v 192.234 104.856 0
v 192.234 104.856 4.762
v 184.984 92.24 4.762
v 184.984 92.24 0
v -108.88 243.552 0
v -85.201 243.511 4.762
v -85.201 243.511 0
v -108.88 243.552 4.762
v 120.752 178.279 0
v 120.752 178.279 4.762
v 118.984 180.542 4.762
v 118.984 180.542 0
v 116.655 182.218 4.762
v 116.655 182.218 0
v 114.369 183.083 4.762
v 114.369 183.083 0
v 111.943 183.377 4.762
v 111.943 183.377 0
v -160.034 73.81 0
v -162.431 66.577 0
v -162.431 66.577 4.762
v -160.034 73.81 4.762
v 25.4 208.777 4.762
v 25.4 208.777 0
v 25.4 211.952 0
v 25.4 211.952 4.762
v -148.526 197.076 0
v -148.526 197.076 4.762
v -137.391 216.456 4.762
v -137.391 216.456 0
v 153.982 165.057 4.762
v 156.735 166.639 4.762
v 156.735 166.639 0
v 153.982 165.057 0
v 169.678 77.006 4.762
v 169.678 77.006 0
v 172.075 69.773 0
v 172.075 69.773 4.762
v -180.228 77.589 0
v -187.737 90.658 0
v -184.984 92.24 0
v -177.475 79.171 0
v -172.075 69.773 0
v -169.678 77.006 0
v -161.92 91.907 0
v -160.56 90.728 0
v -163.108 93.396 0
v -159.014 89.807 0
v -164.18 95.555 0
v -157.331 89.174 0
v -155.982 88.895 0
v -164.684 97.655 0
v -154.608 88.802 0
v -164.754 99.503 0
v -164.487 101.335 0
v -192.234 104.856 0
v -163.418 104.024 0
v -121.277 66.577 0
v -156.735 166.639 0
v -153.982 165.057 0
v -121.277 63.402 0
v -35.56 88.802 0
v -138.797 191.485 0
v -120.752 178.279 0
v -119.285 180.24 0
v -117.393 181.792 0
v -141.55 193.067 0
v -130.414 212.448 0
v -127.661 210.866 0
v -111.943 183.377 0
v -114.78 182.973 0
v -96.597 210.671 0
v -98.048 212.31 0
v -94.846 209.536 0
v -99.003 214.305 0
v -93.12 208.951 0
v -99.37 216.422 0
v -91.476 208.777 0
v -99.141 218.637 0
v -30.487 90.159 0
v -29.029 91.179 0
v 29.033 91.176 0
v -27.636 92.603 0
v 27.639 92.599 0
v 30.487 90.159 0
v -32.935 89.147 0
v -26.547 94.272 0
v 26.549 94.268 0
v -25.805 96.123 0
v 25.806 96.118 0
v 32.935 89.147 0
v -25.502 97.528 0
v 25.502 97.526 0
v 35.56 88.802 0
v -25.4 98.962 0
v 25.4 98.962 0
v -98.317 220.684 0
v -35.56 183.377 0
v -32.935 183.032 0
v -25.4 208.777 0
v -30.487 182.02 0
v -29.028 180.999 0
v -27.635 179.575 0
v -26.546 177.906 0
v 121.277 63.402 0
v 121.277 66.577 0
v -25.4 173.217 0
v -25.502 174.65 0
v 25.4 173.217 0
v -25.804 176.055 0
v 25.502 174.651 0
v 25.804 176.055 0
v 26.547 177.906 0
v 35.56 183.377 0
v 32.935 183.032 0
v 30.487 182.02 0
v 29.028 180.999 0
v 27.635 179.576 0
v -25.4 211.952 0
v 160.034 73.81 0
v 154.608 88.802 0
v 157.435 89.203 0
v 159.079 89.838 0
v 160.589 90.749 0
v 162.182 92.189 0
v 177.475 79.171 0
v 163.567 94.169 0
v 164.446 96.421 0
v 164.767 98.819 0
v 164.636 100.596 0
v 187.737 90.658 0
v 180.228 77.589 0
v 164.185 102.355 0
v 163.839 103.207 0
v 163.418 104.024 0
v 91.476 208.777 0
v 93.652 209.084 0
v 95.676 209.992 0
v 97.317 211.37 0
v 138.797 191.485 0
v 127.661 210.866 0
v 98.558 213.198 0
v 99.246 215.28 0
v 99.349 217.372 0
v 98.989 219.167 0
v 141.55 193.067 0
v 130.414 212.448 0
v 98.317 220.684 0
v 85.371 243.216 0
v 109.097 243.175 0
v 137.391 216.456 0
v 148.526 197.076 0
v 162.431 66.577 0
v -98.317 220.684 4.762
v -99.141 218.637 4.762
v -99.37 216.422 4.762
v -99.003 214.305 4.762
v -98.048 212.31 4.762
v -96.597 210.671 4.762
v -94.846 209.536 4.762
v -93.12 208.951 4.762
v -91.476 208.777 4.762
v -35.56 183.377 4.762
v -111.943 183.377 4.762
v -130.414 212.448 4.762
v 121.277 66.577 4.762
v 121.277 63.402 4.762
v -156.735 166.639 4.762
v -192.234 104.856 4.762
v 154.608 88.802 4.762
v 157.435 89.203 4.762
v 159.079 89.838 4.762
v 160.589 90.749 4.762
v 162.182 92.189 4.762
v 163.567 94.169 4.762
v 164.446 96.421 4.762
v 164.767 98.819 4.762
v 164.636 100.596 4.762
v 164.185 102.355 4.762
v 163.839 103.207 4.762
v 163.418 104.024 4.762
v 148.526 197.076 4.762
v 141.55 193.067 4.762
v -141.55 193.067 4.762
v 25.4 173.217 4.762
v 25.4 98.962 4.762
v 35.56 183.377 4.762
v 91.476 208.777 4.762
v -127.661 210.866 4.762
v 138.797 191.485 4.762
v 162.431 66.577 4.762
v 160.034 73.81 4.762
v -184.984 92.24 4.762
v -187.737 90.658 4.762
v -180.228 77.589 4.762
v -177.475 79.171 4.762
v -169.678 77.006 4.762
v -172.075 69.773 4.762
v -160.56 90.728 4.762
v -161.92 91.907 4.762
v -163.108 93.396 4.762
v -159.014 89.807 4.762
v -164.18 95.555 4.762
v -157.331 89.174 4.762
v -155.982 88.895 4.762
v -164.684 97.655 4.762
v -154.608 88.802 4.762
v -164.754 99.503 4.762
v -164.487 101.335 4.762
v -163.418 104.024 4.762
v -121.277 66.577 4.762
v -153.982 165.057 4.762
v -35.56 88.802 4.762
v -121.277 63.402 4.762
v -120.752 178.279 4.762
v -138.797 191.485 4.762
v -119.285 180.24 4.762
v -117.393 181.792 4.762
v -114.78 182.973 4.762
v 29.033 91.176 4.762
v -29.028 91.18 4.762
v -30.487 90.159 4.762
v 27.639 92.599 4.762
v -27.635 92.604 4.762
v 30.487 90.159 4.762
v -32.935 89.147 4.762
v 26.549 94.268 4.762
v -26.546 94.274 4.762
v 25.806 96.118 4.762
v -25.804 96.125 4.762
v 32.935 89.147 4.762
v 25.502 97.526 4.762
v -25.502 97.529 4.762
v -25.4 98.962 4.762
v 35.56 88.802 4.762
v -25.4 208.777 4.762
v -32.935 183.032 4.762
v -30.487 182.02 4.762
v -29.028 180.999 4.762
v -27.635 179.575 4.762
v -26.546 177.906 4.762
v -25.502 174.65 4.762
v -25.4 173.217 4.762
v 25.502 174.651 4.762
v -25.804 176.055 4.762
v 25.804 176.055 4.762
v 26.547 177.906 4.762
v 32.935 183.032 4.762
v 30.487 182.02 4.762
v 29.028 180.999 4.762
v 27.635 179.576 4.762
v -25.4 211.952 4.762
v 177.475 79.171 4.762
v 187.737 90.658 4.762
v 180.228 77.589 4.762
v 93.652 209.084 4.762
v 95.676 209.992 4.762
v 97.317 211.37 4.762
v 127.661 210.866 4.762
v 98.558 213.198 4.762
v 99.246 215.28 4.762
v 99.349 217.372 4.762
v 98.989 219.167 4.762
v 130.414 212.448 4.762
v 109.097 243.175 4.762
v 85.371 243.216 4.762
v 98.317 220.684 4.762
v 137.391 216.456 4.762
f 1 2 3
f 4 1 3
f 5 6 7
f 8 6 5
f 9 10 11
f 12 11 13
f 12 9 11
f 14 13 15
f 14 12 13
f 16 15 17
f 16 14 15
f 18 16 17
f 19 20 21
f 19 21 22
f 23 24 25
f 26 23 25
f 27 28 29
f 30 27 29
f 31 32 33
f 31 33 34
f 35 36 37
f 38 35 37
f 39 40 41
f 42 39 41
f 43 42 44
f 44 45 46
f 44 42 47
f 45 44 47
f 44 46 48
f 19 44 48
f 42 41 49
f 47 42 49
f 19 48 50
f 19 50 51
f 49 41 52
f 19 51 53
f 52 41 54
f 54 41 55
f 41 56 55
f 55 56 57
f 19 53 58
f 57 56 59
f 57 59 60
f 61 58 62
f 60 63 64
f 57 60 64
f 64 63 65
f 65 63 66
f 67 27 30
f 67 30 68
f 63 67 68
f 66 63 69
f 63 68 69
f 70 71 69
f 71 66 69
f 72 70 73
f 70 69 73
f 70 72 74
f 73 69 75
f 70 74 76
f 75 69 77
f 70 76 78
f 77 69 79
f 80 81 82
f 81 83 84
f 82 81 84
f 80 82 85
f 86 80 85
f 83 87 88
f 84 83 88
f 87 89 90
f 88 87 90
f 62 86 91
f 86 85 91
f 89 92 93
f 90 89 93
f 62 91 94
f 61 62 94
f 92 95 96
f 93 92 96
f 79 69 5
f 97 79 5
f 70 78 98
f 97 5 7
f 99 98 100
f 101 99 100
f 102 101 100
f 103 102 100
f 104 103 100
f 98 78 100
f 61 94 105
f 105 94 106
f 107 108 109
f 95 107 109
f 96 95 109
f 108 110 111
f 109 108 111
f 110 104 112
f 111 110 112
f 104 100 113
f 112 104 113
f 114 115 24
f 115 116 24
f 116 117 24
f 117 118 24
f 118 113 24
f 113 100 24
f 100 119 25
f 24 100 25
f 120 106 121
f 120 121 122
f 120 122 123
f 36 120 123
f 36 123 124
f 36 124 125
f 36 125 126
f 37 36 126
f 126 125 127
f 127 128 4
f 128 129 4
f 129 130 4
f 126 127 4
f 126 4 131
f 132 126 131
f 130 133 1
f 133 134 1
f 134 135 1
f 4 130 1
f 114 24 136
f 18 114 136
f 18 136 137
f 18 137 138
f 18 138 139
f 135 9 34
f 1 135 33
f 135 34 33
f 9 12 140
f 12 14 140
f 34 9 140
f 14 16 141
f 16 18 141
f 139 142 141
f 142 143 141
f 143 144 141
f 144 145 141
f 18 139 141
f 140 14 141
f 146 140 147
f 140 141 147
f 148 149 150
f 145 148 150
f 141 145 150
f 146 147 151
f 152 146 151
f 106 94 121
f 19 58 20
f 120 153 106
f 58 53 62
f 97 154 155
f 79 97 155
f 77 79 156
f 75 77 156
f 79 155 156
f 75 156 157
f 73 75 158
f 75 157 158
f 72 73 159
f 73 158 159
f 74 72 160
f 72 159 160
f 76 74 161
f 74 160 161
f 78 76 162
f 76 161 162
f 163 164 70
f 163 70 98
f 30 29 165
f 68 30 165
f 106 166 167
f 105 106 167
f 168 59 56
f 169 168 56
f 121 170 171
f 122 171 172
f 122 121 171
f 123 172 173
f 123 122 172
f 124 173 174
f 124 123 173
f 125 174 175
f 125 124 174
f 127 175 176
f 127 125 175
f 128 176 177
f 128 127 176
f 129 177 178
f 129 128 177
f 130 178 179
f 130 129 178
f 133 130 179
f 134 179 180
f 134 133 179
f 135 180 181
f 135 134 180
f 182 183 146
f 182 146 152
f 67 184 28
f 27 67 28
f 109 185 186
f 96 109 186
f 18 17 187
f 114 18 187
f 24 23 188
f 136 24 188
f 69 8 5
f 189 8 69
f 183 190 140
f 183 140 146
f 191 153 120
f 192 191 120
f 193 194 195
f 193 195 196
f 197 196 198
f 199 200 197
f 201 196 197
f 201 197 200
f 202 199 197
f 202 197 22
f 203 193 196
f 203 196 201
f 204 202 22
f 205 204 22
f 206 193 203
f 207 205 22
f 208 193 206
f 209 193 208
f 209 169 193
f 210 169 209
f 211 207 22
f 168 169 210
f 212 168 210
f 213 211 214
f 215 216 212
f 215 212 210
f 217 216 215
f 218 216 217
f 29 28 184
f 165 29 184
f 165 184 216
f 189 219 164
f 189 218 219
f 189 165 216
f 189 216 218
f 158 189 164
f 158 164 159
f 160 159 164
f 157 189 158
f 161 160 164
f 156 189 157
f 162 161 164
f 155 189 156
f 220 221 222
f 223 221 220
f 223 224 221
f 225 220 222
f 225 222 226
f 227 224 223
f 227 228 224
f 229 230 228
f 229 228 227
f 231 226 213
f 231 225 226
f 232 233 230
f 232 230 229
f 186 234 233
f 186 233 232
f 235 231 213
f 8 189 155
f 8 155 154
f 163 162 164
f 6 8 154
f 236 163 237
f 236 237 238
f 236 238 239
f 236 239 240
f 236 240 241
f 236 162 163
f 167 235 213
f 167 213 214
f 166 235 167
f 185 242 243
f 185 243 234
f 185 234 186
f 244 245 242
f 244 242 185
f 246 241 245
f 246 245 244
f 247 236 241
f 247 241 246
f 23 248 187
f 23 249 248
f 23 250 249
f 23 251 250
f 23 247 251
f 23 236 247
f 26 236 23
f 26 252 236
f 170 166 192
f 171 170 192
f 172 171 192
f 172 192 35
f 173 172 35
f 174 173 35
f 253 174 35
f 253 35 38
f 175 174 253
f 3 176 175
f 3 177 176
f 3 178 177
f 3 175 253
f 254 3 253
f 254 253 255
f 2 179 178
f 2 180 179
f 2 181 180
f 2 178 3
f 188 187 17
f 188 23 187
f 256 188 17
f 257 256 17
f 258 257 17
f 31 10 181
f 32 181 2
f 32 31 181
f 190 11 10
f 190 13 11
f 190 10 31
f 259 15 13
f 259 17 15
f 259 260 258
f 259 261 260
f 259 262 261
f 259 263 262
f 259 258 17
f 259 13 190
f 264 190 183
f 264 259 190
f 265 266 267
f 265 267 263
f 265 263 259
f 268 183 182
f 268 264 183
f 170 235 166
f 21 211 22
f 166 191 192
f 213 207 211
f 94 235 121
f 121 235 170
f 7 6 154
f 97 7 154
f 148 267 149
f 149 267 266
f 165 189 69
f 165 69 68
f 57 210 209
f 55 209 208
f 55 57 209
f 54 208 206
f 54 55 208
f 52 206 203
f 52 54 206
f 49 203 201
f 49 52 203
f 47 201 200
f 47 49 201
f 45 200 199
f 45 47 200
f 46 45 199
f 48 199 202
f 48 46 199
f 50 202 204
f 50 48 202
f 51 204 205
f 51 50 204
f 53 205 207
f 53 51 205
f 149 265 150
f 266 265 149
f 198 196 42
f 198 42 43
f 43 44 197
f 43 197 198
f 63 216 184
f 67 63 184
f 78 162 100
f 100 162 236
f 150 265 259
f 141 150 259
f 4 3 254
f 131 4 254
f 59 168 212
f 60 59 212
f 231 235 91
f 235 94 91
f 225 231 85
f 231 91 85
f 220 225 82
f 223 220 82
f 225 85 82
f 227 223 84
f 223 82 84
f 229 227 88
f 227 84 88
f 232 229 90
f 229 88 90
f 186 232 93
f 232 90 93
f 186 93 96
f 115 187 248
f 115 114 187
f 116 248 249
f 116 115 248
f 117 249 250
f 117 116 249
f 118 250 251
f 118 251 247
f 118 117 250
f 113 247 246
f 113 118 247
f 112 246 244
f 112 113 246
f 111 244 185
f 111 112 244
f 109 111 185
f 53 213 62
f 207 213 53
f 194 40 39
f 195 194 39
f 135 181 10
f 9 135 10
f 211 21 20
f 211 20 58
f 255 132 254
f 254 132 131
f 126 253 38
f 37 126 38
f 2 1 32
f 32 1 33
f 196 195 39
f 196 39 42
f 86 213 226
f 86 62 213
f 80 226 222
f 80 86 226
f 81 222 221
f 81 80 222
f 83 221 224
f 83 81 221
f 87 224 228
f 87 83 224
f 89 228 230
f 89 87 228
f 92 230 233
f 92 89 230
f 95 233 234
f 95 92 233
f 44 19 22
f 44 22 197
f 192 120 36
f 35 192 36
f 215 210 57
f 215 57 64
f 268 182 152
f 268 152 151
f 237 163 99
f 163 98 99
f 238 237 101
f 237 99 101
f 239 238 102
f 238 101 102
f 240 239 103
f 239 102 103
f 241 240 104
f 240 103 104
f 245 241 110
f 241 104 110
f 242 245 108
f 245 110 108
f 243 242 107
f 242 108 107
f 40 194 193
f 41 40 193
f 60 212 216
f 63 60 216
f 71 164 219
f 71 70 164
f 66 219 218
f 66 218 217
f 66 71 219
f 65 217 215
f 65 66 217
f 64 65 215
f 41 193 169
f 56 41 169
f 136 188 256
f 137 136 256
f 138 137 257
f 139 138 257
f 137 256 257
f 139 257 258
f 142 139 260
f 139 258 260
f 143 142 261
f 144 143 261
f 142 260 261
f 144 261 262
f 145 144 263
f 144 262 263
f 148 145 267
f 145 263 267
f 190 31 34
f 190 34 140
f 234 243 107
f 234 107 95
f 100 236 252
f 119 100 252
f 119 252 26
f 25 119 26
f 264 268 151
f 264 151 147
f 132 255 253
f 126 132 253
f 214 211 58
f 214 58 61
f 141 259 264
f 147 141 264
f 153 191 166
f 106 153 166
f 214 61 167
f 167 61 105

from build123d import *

# Parameters (mm, degrees)
BOSS_EXTRUDE1_DEPTH = 4.7625
CUT_EXTRUDE5_DEPTH  = 591.371112999
SCALE1_SCALE_X      = 0.622
SCALE1_SCALE_Y      = 0.625
SCALE1_SCALE_Z      = 1
CUT_EXTRUDE8_DEPTH  = 422.073439333
FILLET1_R           = 10.16
CUT_EXTRUDE9_DEPTH  = 422.073439333
BOSS_EXTRUDE2_DEPTH = 4.7625
CUT_EXTRUDE10_DEPTH = 422.073439333
CUT_EXTRUDE11_DEPTH = 422.073439333
SKETCH16_W          = 50.8
SKETCH16_H          = 6.35
BOSS_EXTRUDE3_DEPTH = 4.7625
CUT_EXTRUDE12_START = -4.7625
CUT_EXTRUDE12_DEPTH = 4.7625
CUT_EXTRUDE13_DEPTH = 421.232758824


# Read off the part's stored shape, not the designer's step: Cut-Extrude12
with BuildPart() as part:
    # Sketch3 → Boss-Extrude1 (new body)
    with BuildSketch(Plane.XY):
        Polygon((312.000738686, 65.991135768), (166.792028218, 317.5), (-166.792028218, 317.5), (-312.000738686, 65.991135768), (-276.650369343, 4.7625), (276.650369343, 4.7625), align=None)
        Polygon((-166.792028218, 317.5), (166.792028218, 317.5), (60.750369343, 501.169540891), (-60.750369343, 501.169540891), align=None)
    extrude(amount=BOSS_EXTRUDE1_DEPTH)

    # Sketch7 → Cut-Extrude5 (cut, through all)
    with BuildSketch(Plane.XY.offset(4.7625)):
        with BuildLine():
            Line((-147.068010972, 237.363), (147.068010972, 237.363))
            ThreePointArc((147.068010972, 237.363), (158.0665336, 243.713), (158.0665336, 256.413))
            Line((158.0665336, 256.413), (49.751846715, 444.019540891))
            ThreePointArc((49.751846715, 444.019540891), (45.103324087, 448.668063519), (38.753324087, 450.369540891))
            Line((38.753324087, 450.369540891), (-38.753324087, 450.369540891))
            ThreePointArc((-38.753324087, 450.369540891), (-45.103324087, 448.668063519), (-49.751846715, 444.019540891))
            Line((-49.751846715, 444.019540891), (-158.0665336, 256.413))
            ThreePointArc((-158.0665336, 256.413), (-158.0665336, 243.713), (-147.068010972, 237.363))
        make_face()
    extrude(amount=-CUT_EXTRUDE5_DEPTH, mode=Mode.SUBTRACT)


with BuildPart() as part_1:
    # Scale1: scaled about (0, 161.134641619, 2.38125)
    add(part.part.scale((SCALE1_SCALE_X, SCALE1_SCALE_Y, SCALE1_SCALE_Z), about=(0, 161.134641619, 2.38125)))

    # Sketch11 → Cut-Extrude8 (cut, through all)
    with BuildSketch(Plane.XY.offset(4.7625)):
        Polygon((25.4, 183.377365607), (25.4, 88.802053107), (172.163821071, 88.802053107), (117.822833735, 183.377365607), align=None)
        Polygon((-117.822833735, 183.377365607), (-25.4, 183.377365607), (-25.4, 88.802053107), (-172.163821071, 88.802053107), align=None)
    extrude(amount=-CUT_EXTRUDE8_DEPTH, mode=Mode.SUBTRACT)

    # Fillet1
    fillet1_edges = [part_1.edges().sort_by_distance(p)[0] for p in [
        (-172.163821071, 88.802053107, 2.38125),
        (-117.822833735, 183.377365607, 2.38125),
        (-25.4, 183.377365607, 2.38125),
        (-25.4, 88.802053107, 2.38125),
        (117.822833735, 183.377365607, 2.38125),
        (172.163821071, 88.802053107, 2.38125),
        (25.4, 88.802053107, 2.38125),
        (25.4, 183.377365607, 2.38125),
    ]]
    fillet(fillet1_edges, radius=FILLET1_R)

    # Sketch12 → Cut-Extrude9 (cut, through all)
    with BuildSketch(Plane.XY.offset(4.7625)):
        Polygon((141.549539127, 193.067167281), (156.734576332, 166.639056393), (153.981648115, 165.057281684), (138.796610909, 191.485392572), align=None)
        Polygon((101.309190532, 263.101661132), (98.556262314, 261.519886423), (127.660916958, 210.866007222), (130.413845176, 212.447781931), align=None)
        Polygon((-153.981648115, 165.057281684), (-138.796610909, 191.485392572), (-141.549539127, 193.067167281), (-156.734576332, 166.639056393), align=None)
        Polygon((-127.660916958, 210.866007222), (-130.413845176, 212.447781931), (-101.309190532, 263.101661132), (-98.556262314, 261.519886423), align=None)
    extrude(amount=-CUT_EXTRUDE9_DEPTH, mode=Mode.SUBTRACT)

    # Sketch13 → Boss-Extrude2 (add)
    with BuildSketch(Plane.XY.offset(4.7625)):
        Polygon((130.413845176, 212.447781931), (141.549539127, 193.067167281), (148.526307077, 197.075871548), (137.390613126, 216.456486199), align=None)
        Polygon((-148.526307077, 197.075871548), (-137.390613126, 216.456486199), (-130.413845176, 212.447781931), (-141.549539127, 193.067167281), align=None)
    extrude(amount=-BOSS_EXTRUDE2_DEPTH)

    # Sketch14 → Cut-Extrude10 (cut, through all)
    with BuildSketch(Plane.XY.offset(4.7625)):
        Polygon((172.076529731, 63.402053107), (173.900818018, 66.577053107), (121.276529731, 66.577053107), (121.276529731, 63.402053107), align=None)
        Polygon((-121.276529731, 66.577053107), (-121.276529731, 63.402053107), (-172.076529731, 63.402053107), (-173.900818018, 66.577053107), align=None)
    extrude(amount=-CUT_EXTRUDE10_DEPTH, mode=Mode.SUBTRACT)

    # Sketch15 → Cut-Extrude11 (cut, through all)
    with BuildSketch(Plane.XY.offset(4.7625)):
        Polygon((194.064459463, 101.669950462), (192.233568098, 104.85644249), (184.98443241, 92.240012302), (187.737360627, 90.658237593), align=None)
        Polygon((173.900818018, 66.577053107), (180.227916854, 77.588765977), (177.474988636, 79.170540686), (170.239035289, 66.577053107), align=None)
        Polygon((-177.474988636, 79.170540686), (-170.239035289, 66.577053107), (-173.900818018, 66.577053107), (-180.227916854, 77.588765977), align=None)
        Polygon((-187.737360627, 90.658237593), (-184.98443241, 92.240012302), (-192.233568098, 104.85644249), (-194.064459463, 101.669950462), align=None)
    extrude(amount=-CUT_EXTRUDE11_DEPTH, mode=Mode.SUBTRACT)

    # Sketch16 → Boss-Extrude3 (add)
    with BuildSketch(Plane.XY.offset(4.7625)):
        with Locations((0, 208.777365607)):
            Rectangle(SKETCH16_W, SKETCH16_H)
    extrude(amount=-BOSS_EXTRUDE3_DEPTH)

    # Cut-Extrude12 outline → Cut-Extrude12 (cut)
    with BuildSketch(Plane.XY.offset(4.7625).offset(CUT_EXTRUDE12_START)):
        Polygon((-160.03407886, 73.810353985), (-169.67848003, 77.005839249), (-172.075093978, 69.772538371), (-170.239035289, 66.577053107), (-162.430692808, 66.577053107), align=None)
    cut_extrude12 = extrude(amount=CUT_EXTRUDE12_DEPTH, mode=Mode.SUBTRACT)

    # Mirror1: Cut-Extrude12 across plane
    add(cut_extrude12.mirror(Plane(origin=(0, 0, 0), x_dir=(0, 0, 1), z_dir=(1, 0, 0))), mode=Mode.SUBTRACT)

    # Sketch18 → Cut-Extrude13 (cut, through all)
    with BuildSketch(Plane.XY.offset(4.7625)):
        Polygon((-37.786729731, 373.656453664), (37.786729731, 373.656453664), (112.762236491, 243.168725538), (-113.438180507, 243.559444472), align=None)
    extrude(amount=-CUT_EXTRUDE13_DEPTH, mode=Mode.SUBTRACT)


solid = part_1.part
